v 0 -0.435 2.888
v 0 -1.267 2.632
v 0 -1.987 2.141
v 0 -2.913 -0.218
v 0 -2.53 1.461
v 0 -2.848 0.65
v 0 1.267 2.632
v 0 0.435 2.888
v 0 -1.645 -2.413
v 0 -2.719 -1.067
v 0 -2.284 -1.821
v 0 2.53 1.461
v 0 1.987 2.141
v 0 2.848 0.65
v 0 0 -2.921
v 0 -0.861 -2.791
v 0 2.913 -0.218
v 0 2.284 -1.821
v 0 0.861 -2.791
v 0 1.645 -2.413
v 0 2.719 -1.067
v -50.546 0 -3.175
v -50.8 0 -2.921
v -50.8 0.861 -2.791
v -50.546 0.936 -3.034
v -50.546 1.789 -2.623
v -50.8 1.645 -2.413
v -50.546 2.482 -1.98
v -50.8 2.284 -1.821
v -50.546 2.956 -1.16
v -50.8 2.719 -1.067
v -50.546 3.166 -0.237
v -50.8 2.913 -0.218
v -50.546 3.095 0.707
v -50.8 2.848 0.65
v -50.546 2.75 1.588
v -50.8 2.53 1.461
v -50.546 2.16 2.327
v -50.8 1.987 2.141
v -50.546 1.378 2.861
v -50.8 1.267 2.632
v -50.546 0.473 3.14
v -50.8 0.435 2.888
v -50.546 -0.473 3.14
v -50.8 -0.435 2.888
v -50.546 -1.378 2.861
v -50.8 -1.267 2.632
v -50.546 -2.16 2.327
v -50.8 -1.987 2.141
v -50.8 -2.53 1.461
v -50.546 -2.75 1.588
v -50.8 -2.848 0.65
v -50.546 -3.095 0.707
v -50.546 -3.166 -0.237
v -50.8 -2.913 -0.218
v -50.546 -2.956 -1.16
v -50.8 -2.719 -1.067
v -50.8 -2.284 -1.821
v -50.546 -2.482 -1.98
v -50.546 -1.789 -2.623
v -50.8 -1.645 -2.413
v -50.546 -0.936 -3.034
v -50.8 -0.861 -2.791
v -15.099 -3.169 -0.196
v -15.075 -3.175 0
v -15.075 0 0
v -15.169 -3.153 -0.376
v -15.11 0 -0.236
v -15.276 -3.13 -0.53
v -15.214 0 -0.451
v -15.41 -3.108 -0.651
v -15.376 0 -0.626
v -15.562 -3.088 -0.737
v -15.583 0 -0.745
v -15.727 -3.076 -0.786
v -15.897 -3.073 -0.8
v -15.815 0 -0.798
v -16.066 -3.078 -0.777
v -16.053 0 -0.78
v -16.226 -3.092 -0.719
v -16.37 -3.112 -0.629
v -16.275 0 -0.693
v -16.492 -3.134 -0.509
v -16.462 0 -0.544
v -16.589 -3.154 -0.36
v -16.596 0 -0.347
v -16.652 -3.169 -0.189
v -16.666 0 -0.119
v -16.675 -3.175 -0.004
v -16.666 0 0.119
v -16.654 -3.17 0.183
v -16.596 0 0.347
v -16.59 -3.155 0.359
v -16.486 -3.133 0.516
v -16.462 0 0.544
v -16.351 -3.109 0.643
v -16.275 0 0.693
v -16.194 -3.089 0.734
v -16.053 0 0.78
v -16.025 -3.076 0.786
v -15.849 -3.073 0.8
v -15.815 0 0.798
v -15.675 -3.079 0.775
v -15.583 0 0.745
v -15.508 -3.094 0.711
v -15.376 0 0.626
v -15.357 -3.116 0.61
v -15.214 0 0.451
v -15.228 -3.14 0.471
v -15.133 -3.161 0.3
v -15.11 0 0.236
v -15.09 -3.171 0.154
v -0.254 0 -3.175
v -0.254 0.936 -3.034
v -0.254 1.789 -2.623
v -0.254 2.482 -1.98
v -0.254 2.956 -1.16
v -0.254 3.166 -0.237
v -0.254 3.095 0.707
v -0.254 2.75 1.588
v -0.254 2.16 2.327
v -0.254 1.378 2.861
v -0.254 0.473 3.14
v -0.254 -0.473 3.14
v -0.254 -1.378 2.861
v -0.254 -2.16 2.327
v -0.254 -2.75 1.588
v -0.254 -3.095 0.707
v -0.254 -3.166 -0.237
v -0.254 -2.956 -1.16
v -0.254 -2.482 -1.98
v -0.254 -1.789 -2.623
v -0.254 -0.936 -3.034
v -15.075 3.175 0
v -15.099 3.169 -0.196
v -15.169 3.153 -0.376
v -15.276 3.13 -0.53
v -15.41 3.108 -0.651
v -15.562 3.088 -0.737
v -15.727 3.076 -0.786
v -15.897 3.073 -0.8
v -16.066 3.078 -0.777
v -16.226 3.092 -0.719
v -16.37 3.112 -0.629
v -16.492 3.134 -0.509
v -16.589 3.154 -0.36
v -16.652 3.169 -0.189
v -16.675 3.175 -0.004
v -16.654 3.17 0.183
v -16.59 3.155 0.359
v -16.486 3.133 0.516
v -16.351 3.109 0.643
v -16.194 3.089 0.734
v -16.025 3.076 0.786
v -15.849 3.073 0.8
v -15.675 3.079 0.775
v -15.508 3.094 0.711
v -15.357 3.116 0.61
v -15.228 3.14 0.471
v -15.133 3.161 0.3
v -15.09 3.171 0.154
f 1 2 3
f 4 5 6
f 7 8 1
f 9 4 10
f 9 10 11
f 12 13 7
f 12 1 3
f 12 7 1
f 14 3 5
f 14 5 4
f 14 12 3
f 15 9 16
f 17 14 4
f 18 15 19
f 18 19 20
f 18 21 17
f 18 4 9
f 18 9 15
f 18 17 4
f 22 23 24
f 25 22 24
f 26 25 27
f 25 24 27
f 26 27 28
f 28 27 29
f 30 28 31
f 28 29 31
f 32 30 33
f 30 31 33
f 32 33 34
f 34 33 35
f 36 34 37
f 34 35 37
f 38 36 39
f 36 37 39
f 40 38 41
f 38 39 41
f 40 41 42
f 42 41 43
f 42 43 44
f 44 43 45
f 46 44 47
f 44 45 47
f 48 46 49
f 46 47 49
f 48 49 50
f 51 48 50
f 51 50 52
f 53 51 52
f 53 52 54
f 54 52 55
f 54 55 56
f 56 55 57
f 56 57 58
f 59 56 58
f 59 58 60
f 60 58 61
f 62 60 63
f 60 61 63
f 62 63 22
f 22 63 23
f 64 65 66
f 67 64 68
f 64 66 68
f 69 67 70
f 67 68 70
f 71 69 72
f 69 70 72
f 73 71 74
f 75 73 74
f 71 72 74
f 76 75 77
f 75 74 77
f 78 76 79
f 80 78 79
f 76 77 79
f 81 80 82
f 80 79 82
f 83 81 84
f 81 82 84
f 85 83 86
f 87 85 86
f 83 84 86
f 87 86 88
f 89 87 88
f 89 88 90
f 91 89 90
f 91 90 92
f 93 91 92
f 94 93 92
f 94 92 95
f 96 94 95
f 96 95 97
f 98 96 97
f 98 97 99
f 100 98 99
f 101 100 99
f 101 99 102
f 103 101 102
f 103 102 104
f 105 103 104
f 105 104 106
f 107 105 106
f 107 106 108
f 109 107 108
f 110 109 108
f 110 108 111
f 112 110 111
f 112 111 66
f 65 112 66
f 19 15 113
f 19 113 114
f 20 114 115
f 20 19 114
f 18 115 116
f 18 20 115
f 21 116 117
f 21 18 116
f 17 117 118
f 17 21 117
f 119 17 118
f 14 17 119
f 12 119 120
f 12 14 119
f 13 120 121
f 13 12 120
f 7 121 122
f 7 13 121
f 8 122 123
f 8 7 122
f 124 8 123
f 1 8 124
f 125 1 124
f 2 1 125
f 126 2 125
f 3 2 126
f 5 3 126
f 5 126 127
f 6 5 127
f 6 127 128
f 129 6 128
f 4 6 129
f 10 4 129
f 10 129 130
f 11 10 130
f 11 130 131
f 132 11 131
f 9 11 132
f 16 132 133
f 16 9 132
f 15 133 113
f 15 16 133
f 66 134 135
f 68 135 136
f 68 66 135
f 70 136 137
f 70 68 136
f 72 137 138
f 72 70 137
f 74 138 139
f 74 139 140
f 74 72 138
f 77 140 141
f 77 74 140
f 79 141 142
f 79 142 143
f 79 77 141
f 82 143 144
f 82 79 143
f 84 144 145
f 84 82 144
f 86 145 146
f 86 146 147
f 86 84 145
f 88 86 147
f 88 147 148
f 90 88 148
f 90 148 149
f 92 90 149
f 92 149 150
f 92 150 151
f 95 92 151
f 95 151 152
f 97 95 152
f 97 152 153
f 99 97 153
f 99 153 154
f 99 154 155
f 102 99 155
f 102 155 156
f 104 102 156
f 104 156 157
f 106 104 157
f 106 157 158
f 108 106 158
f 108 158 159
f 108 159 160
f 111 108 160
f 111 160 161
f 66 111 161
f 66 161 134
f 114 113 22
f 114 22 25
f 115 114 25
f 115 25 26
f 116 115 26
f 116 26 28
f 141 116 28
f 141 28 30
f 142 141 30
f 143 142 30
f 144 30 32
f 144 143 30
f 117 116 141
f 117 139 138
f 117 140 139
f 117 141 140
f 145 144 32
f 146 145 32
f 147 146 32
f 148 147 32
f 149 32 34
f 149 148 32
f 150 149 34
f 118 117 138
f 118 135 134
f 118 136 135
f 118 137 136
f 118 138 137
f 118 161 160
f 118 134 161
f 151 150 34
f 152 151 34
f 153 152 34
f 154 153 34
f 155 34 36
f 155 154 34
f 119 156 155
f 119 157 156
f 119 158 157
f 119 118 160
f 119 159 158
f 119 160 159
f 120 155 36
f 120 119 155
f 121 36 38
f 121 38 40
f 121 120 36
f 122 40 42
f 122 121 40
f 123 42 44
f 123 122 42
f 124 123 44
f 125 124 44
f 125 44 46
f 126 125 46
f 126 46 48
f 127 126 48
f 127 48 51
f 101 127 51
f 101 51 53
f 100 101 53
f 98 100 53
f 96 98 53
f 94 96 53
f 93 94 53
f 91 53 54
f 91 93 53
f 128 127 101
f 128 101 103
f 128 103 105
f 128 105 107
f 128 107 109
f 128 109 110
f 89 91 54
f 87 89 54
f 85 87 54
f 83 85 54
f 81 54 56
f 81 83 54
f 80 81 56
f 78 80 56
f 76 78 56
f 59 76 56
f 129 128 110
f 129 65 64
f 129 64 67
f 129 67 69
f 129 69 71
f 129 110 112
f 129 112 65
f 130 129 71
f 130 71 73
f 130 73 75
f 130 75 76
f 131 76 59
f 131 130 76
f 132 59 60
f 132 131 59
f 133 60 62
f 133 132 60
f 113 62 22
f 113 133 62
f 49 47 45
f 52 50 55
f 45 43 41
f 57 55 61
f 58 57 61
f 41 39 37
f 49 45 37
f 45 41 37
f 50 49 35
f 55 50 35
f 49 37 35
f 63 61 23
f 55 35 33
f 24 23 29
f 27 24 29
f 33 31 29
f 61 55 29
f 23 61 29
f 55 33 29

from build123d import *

# Parameters (mm, degrees)
SKETCH1_R               = 3.175
BOSS_EXTRUDE1_DEPTH     = 50.8
CHAMFER1_SIZE           = 0.254
SKETCH2_R               = 0.8001
CUT_EXTRUDE1_DEPTH      = 4.175
CUT_EXTRUDE1_DEPTH_BACK = 4.175


with BuildPart() as part:
    # Sketch1 → Boss-Extrude1 (new body)
    with BuildSketch(Plane(origin=(0, 0, 0), x_dir=(0, 0, -1), z_dir=(1, 0, 0))):
        Circle(SKETCH1_R)
    extrude(amount=-BOSS_EXTRUDE1_DEPTH)

    # Chamfer1
    chamfer1_edges = [part.edges().sort_by_distance(p)[0] for p in [
        (0, 0, 3.175),
        (-50.8, 0, 3.175),
    ]]
    chamfer(chamfer1_edges, length=CHAMFER1_SIZE)

    # Sketch2 → Cut-Extrude1 (cut, two sides)
    with BuildSketch(Plane(origin=(0, 0, 0), x_dir=(1, 0, 0), z_dir=(0, 1, 0))) as cut_extrude1_sk:
        with Locations((-15.875, 0)):
            Circle(SKETCH2_R)
    extrude(amount=CUT_EXTRUDE1_DEPTH, mode=Mode.SUBTRACT)
    extrude(cut_extrude1_sk.sketch, amount=-CUT_EXTRUDE1_DEPTH_BACK, mode=Mode.SUBTRACT)


solid = part.part
